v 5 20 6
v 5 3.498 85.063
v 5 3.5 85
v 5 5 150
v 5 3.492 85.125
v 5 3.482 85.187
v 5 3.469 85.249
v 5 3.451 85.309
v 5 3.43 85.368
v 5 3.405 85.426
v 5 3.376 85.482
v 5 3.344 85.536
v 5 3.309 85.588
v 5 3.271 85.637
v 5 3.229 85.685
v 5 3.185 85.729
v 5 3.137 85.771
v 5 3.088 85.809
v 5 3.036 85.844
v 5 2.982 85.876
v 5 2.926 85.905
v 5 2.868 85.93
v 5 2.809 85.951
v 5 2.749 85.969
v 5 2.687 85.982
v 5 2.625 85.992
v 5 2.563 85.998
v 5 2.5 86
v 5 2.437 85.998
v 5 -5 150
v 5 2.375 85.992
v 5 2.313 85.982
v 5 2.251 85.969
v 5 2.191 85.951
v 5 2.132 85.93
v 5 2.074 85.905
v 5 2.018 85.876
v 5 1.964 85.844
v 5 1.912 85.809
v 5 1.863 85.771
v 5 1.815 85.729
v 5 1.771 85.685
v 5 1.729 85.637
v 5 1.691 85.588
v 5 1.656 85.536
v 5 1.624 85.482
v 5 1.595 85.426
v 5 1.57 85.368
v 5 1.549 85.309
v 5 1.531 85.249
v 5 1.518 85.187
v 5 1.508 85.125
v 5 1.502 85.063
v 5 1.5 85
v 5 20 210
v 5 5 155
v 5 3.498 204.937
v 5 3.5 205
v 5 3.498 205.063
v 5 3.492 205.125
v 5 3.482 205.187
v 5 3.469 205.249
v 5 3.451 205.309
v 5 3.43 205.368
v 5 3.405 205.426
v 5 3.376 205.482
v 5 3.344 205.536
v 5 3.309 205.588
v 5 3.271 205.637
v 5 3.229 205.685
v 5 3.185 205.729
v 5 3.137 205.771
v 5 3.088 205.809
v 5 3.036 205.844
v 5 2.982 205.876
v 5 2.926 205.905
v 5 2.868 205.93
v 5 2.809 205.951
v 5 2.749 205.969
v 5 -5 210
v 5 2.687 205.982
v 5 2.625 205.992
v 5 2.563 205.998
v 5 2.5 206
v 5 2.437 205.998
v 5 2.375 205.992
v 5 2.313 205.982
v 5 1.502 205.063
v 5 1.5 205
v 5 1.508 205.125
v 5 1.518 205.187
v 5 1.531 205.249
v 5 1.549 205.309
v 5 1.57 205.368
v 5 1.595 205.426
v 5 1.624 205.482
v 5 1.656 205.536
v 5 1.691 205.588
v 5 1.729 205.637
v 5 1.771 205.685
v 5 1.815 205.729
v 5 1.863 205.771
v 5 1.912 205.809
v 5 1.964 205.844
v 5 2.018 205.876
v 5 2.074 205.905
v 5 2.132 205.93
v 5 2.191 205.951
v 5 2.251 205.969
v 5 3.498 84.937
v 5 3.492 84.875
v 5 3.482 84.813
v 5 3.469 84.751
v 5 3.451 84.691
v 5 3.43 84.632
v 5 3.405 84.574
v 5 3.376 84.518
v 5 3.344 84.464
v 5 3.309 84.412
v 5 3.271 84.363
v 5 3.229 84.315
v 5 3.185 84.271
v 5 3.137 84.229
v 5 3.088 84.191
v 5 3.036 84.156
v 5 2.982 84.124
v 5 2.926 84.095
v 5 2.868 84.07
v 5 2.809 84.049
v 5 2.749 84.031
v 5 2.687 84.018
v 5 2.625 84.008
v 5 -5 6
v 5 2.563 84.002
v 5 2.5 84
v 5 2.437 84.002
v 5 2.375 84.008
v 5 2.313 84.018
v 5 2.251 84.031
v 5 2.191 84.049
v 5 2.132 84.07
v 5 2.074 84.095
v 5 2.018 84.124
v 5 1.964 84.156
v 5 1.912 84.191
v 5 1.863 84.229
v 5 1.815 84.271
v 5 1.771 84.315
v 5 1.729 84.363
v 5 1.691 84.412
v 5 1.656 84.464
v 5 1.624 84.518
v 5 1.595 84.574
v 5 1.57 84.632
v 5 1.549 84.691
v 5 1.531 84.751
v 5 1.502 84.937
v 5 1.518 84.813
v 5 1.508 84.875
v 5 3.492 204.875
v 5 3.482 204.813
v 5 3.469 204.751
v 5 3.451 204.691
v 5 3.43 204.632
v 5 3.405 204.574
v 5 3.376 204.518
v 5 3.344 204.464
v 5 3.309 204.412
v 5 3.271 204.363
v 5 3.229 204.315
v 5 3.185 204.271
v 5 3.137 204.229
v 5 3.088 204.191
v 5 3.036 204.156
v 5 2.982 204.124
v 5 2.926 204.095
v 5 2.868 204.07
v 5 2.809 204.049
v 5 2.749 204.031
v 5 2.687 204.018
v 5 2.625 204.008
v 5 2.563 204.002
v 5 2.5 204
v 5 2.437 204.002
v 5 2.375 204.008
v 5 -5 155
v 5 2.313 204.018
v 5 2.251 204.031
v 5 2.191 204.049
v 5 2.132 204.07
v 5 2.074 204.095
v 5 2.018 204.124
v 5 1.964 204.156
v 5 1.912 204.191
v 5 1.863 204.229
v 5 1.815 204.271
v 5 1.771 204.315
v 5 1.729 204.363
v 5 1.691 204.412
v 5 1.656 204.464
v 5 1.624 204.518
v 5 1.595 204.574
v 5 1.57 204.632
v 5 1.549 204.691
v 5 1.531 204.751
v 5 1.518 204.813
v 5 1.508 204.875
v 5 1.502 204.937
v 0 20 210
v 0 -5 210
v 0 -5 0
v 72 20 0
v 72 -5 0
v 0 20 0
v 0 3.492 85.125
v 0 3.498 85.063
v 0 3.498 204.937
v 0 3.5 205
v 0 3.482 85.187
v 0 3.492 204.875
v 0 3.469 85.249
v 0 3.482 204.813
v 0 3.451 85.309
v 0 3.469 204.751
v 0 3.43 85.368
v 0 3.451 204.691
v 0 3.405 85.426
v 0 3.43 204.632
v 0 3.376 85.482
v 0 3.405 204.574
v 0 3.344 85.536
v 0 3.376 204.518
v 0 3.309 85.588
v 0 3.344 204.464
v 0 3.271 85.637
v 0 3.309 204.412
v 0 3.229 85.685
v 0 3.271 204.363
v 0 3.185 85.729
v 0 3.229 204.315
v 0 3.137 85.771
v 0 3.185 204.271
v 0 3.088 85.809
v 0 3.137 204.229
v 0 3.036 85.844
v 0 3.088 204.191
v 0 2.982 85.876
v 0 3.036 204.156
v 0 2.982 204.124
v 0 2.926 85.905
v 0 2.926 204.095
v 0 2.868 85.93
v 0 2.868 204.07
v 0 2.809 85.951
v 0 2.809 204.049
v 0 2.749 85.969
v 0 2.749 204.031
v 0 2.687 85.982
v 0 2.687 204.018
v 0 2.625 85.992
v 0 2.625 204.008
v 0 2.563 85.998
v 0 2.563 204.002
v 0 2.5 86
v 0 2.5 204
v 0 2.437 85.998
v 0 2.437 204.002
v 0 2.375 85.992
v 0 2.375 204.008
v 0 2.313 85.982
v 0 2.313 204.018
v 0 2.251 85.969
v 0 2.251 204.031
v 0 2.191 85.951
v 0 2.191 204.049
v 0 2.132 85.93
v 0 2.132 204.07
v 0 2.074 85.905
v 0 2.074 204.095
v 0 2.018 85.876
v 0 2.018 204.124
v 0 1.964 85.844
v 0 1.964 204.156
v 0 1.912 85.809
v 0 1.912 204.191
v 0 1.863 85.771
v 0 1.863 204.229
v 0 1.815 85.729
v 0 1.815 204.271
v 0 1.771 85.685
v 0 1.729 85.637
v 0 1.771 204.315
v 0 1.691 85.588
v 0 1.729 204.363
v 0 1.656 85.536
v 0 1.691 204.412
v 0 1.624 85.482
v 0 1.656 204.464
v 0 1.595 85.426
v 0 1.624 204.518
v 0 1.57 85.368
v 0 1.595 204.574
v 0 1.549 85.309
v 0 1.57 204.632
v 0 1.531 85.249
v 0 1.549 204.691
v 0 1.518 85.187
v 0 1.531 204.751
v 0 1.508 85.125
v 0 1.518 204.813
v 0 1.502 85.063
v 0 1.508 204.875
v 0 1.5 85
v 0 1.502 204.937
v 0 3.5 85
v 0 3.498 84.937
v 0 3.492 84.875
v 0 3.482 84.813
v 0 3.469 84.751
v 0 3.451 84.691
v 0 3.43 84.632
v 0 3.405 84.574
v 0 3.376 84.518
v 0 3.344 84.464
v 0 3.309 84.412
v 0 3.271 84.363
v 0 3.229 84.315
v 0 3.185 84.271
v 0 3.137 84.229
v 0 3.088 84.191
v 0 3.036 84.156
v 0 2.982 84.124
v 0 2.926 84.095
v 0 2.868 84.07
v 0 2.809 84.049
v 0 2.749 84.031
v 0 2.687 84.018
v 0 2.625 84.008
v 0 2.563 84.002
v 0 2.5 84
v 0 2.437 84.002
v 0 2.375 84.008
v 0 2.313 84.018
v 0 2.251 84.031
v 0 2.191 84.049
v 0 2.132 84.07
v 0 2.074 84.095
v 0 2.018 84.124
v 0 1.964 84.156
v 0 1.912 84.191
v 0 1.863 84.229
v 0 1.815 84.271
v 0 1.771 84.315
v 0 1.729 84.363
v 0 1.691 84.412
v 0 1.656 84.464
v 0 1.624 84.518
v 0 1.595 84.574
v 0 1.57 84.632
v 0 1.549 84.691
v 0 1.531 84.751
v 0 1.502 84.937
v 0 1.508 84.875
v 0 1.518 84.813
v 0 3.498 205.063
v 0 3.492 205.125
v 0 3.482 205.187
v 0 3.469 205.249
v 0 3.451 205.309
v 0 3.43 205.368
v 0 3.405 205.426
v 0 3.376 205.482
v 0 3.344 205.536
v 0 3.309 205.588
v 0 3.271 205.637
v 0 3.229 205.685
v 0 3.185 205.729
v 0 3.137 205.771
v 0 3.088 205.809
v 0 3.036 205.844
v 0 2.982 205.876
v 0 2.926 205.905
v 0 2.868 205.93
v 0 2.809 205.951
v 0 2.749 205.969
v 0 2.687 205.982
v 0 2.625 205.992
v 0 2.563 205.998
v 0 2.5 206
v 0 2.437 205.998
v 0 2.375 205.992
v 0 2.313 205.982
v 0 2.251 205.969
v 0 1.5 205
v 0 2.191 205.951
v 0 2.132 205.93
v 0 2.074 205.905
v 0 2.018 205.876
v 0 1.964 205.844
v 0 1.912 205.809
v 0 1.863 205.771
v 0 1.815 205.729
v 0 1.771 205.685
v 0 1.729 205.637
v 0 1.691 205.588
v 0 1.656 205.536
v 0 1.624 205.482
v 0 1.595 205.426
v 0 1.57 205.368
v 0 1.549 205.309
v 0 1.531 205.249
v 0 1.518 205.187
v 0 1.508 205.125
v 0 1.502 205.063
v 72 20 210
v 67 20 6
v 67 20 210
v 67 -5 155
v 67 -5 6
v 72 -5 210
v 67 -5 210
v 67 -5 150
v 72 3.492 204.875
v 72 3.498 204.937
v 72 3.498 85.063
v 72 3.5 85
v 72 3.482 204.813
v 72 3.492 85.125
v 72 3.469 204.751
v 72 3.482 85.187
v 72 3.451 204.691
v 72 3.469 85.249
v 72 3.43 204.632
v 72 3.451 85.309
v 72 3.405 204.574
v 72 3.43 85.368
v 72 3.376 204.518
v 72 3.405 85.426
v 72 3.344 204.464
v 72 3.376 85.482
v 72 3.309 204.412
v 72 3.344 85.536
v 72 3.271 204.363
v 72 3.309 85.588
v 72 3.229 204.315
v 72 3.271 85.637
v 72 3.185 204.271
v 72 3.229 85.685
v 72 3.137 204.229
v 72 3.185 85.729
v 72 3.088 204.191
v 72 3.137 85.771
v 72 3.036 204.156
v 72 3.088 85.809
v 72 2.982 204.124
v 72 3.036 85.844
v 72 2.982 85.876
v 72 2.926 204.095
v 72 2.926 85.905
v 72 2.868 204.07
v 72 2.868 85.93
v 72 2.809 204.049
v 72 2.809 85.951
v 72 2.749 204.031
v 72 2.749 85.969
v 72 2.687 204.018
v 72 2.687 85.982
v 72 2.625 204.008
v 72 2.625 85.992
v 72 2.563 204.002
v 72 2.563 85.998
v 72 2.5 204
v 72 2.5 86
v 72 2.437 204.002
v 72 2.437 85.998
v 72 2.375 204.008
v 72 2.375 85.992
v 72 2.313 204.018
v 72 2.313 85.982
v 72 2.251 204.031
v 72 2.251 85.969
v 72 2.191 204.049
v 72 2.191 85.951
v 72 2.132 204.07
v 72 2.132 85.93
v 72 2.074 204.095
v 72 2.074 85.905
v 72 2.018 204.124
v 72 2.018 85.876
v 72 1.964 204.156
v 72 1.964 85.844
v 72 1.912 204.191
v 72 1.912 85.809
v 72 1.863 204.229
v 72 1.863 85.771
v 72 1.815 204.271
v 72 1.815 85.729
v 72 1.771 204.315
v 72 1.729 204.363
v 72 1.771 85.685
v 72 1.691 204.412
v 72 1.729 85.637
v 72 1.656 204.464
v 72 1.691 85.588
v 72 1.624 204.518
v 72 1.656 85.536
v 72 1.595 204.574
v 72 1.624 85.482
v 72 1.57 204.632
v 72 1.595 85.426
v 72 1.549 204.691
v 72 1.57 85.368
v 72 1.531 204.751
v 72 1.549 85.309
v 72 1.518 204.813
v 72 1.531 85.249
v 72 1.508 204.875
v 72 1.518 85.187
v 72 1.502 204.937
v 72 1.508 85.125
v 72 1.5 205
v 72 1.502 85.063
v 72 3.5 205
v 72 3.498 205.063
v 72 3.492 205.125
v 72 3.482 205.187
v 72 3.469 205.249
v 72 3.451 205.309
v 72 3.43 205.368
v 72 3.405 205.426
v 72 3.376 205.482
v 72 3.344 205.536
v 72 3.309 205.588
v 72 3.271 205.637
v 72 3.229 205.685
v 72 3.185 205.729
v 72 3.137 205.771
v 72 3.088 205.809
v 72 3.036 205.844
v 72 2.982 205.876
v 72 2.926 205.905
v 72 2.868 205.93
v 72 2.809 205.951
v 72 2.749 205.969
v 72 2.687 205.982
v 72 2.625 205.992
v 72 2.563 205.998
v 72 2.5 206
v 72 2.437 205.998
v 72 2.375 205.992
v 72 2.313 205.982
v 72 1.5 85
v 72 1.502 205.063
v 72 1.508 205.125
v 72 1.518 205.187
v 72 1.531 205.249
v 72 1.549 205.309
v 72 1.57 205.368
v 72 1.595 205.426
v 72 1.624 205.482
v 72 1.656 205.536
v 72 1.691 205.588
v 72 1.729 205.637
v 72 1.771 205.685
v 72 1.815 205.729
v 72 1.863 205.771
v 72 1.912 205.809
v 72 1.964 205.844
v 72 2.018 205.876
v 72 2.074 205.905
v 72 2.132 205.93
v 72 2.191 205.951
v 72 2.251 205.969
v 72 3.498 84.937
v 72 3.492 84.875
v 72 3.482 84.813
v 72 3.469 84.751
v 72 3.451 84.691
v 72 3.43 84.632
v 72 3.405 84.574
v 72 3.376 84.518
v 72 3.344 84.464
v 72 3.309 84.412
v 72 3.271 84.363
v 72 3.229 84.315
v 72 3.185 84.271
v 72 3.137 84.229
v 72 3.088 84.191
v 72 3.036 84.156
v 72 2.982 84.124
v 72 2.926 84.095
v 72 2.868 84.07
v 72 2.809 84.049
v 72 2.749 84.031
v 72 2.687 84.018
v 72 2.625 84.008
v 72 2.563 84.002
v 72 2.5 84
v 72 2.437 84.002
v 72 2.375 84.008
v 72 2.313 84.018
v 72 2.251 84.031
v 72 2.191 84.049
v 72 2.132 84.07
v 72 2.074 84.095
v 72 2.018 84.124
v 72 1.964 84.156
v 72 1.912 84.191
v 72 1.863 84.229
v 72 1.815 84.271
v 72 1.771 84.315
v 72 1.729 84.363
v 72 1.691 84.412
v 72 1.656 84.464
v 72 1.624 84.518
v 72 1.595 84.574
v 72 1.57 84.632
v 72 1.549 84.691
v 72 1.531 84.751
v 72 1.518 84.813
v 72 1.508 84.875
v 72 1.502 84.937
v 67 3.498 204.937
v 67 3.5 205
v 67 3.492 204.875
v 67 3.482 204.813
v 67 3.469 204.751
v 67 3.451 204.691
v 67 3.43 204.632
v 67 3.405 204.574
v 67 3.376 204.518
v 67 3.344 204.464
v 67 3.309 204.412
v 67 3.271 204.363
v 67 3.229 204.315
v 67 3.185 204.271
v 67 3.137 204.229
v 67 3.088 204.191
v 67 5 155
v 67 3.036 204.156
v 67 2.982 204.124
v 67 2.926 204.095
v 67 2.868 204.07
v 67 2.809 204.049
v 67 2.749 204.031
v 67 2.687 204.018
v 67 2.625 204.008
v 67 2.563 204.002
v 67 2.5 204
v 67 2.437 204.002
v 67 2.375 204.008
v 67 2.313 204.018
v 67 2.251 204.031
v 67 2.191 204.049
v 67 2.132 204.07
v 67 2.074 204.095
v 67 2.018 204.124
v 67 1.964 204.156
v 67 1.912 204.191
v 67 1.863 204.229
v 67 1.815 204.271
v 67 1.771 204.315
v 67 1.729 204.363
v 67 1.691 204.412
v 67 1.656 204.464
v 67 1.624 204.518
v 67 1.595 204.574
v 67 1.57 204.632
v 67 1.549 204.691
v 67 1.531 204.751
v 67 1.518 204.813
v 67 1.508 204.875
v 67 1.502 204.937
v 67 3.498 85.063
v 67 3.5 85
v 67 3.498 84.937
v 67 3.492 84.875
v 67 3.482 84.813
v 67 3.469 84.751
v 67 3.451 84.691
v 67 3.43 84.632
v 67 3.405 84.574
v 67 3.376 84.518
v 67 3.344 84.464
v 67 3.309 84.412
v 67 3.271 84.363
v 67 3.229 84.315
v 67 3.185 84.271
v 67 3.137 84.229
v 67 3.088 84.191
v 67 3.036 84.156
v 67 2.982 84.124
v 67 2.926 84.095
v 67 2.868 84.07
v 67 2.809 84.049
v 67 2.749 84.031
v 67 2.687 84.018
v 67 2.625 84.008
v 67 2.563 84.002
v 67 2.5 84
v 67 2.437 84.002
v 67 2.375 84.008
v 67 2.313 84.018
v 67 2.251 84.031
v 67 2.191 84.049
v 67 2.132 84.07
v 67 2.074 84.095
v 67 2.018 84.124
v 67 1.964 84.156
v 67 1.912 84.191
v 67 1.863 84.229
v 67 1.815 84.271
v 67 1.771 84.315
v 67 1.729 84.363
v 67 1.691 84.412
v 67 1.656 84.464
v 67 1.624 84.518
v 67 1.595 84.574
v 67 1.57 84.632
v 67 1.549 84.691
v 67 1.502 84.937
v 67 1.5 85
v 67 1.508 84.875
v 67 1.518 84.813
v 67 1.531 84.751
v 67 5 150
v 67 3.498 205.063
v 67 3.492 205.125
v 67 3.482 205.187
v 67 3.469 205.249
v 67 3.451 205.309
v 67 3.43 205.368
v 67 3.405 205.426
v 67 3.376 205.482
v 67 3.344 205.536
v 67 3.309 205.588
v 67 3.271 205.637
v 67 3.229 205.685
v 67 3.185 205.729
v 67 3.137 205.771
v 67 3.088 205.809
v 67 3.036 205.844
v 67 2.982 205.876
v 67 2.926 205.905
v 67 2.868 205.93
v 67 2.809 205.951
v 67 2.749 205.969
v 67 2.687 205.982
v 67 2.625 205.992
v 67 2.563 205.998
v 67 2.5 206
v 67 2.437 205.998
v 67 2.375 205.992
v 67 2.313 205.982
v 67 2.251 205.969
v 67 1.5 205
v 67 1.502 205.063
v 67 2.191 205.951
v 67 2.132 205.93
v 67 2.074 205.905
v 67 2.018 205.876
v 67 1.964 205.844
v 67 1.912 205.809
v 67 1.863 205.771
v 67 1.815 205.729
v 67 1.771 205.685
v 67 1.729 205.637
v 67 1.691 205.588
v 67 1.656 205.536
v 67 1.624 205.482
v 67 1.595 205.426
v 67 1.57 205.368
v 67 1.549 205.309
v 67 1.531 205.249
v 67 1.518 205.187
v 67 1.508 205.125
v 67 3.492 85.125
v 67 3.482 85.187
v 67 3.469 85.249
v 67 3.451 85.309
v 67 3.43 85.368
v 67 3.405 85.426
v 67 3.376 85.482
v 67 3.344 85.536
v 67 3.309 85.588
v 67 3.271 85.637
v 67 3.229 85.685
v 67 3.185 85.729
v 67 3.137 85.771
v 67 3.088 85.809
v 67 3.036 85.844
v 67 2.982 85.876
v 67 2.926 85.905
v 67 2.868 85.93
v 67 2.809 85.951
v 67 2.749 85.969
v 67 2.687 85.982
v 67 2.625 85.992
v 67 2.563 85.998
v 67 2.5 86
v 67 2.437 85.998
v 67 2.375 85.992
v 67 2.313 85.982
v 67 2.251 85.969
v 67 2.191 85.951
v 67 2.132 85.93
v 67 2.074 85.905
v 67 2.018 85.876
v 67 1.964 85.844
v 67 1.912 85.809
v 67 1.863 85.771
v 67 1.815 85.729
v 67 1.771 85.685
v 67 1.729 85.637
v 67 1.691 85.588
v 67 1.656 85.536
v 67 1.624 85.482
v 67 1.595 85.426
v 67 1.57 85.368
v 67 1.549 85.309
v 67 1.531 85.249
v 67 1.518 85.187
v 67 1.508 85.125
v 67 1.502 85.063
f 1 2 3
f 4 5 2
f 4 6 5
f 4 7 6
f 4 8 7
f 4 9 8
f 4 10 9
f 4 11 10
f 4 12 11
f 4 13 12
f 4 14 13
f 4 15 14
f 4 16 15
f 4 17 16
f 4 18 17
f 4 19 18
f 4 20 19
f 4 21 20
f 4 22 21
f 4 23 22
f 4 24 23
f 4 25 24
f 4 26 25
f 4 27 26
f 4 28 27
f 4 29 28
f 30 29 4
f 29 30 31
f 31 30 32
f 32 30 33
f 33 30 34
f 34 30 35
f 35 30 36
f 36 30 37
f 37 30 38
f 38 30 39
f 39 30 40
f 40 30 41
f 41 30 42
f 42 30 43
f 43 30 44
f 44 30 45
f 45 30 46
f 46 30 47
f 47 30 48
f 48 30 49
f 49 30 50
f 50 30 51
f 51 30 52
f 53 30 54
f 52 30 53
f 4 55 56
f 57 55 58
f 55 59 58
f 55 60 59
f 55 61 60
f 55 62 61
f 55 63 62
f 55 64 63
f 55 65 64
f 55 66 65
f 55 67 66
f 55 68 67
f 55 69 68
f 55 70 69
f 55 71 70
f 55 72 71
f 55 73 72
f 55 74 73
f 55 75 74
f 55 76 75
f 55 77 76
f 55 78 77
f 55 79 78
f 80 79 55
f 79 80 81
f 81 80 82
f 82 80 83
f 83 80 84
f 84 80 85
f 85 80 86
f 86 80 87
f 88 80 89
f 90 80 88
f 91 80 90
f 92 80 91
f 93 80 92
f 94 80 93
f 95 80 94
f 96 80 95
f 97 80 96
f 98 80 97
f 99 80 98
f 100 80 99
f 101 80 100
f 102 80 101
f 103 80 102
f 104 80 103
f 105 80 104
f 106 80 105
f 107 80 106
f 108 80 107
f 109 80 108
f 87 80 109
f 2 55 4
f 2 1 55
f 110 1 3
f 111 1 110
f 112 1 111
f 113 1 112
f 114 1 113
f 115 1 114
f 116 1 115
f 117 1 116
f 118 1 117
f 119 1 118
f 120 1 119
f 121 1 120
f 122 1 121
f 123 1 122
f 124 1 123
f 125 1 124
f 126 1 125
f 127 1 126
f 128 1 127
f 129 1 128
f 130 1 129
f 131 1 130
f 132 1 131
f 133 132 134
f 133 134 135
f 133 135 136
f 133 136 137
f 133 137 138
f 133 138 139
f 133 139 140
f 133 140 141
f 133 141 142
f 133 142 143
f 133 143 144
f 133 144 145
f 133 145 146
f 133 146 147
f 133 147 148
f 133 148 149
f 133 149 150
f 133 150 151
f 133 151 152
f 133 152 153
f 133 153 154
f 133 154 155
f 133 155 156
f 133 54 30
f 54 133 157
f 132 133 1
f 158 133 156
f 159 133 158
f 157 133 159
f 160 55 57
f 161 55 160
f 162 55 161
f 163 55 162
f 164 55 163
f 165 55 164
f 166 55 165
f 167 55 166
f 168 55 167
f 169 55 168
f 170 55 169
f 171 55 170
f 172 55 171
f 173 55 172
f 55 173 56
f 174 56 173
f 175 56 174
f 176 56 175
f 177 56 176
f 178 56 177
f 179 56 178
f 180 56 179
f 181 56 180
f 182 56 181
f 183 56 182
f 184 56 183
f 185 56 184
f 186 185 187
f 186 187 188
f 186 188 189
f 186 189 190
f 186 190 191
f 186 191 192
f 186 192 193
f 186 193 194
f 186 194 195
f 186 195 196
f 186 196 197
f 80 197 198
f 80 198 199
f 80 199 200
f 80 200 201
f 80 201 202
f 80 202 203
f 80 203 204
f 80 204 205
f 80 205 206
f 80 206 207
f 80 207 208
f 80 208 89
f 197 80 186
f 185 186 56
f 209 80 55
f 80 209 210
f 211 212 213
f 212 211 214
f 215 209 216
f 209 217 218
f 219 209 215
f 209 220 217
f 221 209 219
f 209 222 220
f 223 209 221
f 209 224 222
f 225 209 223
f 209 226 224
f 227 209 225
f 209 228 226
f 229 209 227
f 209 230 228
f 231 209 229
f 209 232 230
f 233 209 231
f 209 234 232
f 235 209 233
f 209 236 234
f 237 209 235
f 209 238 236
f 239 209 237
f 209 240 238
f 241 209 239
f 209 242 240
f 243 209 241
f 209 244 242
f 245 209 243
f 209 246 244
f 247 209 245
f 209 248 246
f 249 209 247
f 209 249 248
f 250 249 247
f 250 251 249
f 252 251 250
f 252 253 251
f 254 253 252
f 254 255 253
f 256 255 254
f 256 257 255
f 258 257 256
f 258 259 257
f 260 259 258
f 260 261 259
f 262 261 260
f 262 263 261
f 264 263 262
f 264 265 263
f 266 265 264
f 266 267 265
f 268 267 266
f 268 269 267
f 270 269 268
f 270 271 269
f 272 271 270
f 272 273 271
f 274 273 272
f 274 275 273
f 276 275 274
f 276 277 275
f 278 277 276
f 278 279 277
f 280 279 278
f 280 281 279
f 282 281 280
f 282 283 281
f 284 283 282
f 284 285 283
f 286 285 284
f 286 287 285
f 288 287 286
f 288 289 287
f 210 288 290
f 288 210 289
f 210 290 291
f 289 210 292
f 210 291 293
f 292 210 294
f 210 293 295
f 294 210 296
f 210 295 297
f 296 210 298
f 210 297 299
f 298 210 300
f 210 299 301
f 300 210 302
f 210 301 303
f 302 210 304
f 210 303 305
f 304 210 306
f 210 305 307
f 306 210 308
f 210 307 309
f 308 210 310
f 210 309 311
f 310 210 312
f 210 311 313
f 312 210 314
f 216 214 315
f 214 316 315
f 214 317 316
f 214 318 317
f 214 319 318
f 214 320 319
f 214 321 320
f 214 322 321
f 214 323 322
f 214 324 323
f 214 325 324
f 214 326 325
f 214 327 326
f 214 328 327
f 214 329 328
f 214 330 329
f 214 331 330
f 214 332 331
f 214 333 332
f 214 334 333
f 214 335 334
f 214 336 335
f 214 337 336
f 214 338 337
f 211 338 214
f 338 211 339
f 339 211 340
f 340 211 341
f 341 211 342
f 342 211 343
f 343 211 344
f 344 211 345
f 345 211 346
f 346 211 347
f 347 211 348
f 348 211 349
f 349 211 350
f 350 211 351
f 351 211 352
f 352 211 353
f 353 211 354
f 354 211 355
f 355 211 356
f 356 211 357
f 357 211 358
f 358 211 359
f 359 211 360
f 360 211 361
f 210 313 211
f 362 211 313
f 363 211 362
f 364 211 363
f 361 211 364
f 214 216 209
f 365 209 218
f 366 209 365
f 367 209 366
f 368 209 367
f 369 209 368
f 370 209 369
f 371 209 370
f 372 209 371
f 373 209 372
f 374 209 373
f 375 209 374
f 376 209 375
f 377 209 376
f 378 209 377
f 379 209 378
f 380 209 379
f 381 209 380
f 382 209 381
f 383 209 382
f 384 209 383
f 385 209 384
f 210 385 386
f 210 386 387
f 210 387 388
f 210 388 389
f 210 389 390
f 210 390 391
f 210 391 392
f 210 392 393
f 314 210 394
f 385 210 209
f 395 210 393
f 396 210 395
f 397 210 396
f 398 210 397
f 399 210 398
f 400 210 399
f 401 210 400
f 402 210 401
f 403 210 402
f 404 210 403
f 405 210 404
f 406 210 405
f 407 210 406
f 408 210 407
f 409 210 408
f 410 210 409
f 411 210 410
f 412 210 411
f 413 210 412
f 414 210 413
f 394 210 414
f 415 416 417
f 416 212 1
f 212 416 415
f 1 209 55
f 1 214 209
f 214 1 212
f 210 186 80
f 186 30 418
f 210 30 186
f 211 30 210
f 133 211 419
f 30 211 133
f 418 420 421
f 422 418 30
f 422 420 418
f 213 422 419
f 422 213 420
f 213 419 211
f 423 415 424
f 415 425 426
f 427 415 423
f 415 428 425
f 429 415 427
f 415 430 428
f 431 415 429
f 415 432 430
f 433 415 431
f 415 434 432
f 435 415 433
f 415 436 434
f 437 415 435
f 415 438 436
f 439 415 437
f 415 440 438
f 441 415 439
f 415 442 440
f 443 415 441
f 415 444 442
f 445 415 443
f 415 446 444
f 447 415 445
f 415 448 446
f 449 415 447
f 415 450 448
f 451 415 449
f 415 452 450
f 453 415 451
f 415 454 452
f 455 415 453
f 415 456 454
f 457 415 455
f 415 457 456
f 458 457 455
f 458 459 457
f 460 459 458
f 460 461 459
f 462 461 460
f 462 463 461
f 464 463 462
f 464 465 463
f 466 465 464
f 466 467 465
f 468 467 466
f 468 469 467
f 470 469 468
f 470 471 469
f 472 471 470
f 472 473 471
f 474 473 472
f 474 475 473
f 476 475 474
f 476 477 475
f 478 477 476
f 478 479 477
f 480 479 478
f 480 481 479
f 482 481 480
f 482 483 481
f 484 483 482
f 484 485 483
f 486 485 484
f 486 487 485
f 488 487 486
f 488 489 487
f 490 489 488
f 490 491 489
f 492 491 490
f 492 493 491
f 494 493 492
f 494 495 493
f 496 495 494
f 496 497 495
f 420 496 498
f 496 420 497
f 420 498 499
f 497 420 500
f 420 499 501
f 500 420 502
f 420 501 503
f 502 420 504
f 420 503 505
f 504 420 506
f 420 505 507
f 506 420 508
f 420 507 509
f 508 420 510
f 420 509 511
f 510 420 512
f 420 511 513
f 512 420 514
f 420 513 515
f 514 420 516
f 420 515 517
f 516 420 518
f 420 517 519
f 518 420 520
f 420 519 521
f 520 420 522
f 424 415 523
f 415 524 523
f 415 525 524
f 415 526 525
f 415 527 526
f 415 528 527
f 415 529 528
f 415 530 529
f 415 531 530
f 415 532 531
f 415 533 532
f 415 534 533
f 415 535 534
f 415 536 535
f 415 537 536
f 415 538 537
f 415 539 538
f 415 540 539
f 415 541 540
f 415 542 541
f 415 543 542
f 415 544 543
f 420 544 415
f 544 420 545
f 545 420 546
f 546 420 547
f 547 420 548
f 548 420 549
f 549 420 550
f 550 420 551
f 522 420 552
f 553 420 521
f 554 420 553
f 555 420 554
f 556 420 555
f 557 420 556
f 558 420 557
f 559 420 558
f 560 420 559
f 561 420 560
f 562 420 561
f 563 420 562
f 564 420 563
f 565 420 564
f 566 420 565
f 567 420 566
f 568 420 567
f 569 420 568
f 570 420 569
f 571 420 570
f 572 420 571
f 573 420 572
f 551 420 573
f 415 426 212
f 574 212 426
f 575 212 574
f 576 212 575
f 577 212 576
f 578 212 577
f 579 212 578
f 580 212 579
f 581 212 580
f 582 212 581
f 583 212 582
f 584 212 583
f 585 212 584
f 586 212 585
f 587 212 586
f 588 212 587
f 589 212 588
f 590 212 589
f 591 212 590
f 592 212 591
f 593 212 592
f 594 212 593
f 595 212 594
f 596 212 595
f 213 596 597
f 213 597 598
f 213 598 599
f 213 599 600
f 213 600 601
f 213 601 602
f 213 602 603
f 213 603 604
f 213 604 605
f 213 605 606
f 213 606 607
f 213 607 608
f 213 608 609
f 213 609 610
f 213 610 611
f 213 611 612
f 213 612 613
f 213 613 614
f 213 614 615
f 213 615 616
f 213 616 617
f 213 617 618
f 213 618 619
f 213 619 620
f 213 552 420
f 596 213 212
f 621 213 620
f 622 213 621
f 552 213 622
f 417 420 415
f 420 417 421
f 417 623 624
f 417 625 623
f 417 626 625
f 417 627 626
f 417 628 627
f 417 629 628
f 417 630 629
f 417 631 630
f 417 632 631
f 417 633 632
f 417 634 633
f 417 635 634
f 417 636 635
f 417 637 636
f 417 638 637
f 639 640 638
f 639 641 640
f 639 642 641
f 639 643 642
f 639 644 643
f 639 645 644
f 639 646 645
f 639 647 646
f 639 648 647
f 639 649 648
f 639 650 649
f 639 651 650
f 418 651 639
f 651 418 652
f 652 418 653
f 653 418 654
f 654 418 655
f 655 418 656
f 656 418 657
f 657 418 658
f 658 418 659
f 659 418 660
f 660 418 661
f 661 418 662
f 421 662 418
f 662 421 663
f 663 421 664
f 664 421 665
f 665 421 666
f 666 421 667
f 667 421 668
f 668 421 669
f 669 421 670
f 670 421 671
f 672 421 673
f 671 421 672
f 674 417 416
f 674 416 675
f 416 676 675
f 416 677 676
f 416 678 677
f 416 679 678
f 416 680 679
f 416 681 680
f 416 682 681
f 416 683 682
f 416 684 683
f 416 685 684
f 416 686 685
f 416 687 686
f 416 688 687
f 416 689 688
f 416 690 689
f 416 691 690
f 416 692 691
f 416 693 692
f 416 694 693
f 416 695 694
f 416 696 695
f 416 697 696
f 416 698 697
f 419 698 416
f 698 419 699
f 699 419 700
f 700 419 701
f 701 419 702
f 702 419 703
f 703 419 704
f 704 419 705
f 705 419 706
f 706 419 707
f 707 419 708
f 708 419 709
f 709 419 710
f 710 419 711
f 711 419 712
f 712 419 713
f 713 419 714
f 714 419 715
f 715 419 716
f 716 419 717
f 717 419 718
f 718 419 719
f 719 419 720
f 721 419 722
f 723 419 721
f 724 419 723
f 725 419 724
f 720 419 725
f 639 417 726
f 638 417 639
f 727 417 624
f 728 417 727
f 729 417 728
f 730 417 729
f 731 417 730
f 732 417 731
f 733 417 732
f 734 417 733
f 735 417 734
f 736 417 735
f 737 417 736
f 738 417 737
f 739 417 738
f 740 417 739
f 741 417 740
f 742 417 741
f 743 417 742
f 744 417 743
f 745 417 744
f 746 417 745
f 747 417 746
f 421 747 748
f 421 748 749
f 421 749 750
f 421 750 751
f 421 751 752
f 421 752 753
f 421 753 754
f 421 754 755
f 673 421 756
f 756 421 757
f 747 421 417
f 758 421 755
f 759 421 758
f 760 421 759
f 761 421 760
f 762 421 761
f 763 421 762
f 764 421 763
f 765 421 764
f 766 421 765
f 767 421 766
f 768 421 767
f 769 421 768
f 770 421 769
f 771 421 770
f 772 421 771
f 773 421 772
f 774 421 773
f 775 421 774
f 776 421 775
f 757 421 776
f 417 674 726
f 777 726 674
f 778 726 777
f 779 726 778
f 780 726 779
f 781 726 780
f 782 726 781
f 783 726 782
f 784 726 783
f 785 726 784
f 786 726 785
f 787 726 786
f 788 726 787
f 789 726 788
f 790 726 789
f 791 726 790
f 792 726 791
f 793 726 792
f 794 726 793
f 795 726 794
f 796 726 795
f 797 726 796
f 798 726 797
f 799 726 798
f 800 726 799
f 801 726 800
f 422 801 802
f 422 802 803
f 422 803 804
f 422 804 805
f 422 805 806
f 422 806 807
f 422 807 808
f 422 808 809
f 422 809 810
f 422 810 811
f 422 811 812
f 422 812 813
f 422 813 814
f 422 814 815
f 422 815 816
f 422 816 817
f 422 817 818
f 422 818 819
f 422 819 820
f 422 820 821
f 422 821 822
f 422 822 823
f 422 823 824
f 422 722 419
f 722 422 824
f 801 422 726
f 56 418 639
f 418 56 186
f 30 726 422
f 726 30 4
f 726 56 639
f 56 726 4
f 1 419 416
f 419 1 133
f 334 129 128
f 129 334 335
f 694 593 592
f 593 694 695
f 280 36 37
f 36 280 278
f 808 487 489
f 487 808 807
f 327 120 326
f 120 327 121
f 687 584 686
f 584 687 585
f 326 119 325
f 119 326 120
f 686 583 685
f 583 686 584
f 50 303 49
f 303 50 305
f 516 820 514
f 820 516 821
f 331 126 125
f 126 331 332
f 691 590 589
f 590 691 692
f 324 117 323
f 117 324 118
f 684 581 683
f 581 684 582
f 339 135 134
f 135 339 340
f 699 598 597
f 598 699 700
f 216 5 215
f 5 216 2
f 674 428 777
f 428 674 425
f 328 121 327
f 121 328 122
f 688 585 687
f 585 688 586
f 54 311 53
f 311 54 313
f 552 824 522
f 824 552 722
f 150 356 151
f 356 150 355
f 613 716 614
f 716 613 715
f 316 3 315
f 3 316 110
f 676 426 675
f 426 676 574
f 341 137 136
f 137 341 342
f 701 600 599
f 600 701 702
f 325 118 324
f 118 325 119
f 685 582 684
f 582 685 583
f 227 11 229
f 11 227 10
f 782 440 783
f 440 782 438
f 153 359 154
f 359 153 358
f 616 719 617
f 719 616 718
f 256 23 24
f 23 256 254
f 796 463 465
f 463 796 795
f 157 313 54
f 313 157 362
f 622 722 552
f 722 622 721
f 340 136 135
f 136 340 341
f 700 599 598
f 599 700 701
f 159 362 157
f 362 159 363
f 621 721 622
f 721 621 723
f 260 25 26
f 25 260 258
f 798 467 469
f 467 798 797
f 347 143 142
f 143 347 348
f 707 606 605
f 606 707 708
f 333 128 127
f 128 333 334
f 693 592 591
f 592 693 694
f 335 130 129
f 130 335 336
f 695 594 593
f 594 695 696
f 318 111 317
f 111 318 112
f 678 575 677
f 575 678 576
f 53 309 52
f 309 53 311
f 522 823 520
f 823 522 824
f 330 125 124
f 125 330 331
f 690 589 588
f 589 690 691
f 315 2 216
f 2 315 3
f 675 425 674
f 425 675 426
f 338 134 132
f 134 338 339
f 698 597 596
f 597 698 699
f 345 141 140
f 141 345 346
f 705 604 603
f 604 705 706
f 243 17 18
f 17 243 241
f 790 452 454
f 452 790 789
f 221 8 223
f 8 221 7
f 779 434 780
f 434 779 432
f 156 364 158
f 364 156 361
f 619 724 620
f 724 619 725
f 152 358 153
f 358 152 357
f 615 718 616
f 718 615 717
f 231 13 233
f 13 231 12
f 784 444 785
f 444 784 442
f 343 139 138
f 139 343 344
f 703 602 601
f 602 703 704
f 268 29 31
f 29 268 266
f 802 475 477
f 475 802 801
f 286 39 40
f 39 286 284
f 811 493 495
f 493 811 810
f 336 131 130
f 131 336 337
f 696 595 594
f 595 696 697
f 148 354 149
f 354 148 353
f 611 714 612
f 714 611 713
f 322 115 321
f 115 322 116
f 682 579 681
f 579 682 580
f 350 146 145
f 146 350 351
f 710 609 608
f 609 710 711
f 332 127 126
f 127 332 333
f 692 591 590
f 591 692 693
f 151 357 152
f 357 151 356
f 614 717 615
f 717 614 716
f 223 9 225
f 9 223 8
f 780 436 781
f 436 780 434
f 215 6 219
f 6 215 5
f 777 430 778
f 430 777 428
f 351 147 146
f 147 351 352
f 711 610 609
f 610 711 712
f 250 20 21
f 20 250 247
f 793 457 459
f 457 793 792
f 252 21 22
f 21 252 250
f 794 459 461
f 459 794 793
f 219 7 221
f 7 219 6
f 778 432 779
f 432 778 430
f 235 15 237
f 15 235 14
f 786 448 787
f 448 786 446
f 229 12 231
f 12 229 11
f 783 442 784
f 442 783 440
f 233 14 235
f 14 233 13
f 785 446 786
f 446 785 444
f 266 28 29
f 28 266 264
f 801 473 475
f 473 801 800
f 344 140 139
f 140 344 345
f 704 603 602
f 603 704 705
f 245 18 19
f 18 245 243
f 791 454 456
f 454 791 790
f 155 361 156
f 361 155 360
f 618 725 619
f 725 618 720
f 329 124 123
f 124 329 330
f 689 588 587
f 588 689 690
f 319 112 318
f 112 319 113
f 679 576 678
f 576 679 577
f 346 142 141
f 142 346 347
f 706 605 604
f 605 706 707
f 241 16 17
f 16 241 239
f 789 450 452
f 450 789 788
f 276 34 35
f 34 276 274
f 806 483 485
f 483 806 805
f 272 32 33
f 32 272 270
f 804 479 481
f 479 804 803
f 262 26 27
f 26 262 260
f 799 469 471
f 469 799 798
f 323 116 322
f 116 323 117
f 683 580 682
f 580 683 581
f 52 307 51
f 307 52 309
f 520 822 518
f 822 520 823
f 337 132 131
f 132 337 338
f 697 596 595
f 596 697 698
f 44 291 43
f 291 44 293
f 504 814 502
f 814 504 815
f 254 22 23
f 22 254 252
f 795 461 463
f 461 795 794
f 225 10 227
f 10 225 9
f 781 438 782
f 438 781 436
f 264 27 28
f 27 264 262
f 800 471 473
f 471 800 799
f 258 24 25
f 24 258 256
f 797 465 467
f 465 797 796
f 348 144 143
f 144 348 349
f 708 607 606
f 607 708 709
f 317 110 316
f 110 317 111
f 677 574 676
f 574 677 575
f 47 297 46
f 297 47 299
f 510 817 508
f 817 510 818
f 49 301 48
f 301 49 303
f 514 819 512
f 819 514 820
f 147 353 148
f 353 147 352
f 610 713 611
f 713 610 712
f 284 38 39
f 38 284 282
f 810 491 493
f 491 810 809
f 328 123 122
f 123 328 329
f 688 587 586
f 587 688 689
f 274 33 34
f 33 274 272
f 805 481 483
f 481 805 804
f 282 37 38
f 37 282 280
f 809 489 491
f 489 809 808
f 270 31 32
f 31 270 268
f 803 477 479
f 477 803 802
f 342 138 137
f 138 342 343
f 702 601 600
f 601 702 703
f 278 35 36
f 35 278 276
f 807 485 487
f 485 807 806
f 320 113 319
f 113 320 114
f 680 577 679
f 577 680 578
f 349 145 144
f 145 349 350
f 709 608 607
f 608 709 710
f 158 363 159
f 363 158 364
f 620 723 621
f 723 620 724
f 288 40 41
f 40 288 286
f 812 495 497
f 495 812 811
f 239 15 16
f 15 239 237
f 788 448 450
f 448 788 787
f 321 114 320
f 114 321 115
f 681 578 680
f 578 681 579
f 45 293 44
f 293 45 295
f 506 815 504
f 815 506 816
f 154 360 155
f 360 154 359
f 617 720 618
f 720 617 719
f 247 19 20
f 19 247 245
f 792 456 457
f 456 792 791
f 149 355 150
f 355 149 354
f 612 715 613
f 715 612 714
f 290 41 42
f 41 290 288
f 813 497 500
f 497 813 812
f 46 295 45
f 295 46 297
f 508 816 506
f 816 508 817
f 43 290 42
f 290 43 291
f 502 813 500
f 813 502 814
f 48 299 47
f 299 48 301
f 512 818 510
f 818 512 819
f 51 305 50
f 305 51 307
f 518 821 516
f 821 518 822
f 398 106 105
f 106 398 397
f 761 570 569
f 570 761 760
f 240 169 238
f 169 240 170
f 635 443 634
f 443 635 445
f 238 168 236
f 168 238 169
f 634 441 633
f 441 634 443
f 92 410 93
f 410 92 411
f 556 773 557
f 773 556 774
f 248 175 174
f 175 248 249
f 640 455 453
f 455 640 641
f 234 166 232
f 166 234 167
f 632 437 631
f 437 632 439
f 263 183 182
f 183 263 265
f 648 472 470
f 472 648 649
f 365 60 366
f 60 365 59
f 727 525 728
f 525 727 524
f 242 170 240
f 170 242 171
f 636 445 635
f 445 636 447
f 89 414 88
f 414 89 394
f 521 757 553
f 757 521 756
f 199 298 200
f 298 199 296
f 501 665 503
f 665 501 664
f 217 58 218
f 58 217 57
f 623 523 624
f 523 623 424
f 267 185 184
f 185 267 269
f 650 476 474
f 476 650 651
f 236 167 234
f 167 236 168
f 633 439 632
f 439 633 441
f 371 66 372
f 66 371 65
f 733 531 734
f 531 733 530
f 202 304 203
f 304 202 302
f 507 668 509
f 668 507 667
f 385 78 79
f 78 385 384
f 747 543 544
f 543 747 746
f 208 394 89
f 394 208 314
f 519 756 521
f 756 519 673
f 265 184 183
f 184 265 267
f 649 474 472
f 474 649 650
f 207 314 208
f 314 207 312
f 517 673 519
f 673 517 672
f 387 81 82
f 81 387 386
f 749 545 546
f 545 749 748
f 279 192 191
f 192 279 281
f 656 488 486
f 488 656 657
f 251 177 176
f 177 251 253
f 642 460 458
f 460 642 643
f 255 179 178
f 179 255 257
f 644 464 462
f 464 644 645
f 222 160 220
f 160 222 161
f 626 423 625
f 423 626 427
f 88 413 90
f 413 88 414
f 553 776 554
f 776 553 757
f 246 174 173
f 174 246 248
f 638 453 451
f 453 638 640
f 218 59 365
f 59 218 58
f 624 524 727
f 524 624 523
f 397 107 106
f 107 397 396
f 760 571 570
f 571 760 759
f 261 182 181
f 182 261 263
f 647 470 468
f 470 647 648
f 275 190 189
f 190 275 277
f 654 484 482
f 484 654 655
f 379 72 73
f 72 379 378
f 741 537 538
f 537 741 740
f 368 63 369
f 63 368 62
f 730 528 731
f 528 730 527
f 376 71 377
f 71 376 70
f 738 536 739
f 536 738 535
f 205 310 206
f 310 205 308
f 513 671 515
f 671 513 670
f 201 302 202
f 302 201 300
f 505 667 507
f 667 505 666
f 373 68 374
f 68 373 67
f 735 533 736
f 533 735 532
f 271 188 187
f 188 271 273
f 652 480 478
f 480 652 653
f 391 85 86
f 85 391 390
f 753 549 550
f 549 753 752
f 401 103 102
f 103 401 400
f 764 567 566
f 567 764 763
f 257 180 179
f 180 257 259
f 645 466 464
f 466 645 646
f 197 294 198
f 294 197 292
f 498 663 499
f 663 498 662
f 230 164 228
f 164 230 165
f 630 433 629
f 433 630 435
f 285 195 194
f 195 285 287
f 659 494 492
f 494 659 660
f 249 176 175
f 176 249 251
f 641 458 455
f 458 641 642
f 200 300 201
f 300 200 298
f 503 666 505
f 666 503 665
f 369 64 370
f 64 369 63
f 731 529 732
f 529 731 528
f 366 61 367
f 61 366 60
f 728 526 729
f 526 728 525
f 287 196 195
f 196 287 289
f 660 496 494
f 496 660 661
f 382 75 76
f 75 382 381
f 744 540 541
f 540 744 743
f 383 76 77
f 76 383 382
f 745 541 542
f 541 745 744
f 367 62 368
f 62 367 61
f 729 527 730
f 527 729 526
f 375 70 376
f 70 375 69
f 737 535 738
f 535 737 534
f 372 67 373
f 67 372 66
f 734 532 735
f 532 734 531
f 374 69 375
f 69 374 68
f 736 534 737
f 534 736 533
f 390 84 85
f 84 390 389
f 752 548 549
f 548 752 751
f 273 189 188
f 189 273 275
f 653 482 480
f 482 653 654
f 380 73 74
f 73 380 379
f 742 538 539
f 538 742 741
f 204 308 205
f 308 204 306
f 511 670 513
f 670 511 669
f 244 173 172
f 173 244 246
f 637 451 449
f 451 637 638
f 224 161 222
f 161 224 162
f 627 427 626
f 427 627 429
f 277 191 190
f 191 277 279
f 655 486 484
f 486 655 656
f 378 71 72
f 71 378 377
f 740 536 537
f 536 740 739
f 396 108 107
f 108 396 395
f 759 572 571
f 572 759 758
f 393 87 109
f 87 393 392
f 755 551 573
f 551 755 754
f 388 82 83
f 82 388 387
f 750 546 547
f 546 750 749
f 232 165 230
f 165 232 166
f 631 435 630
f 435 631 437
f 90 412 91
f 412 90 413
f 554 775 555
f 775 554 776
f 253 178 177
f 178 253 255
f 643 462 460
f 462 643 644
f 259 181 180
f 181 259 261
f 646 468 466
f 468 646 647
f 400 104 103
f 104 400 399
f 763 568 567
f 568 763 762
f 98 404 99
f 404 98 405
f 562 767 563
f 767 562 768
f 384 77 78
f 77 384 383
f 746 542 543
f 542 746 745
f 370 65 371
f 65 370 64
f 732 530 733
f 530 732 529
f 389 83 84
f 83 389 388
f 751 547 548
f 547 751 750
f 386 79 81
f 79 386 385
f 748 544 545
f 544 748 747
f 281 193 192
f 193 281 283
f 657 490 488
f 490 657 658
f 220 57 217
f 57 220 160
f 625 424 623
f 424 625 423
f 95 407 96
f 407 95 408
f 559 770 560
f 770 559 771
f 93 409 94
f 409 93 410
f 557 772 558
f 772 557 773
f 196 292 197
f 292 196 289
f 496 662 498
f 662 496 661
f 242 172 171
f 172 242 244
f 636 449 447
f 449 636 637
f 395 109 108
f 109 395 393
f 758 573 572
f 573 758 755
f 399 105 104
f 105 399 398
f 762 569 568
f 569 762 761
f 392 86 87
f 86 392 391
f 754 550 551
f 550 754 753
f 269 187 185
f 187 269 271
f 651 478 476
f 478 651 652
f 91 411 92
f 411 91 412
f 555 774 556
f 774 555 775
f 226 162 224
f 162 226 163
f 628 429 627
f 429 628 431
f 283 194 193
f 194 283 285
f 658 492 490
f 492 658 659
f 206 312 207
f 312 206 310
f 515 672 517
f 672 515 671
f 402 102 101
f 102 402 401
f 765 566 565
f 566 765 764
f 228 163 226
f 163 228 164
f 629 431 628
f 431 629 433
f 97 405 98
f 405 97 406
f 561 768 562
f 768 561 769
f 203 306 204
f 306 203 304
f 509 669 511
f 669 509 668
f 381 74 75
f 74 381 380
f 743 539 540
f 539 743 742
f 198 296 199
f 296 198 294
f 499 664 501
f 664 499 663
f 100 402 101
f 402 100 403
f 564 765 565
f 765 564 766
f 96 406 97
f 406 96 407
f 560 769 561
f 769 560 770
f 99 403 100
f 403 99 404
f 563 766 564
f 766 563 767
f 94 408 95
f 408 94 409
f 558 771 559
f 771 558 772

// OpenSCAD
difference(){
	union(){
        translate([0,-5,0]){
           cube([5,25,210], center=false);
       }
       translate([0+5+62,-5,0]){
           cube([5,25,210], center=false);
       }

       translate([0,-5,150]){
           cube([72,10,5], center=false);
       }


       translate([0,-5,00]){
           cube([72,25,6], center=false);
       }

	}
	union() {       
			   
       translate([-30,2.5,85]){
            rotate(a = [0,90,0]) {
                cylinder(h=600, r=1, $fn=100, center=false);
            }
       }			   
		   
       translate([-30,2.5,205]){
            rotate(a = [0,90,0]) {
                cylinder(h=600, r=1, $fn=100, center=false);
            }
       }			   


			
   


        
	}
}
